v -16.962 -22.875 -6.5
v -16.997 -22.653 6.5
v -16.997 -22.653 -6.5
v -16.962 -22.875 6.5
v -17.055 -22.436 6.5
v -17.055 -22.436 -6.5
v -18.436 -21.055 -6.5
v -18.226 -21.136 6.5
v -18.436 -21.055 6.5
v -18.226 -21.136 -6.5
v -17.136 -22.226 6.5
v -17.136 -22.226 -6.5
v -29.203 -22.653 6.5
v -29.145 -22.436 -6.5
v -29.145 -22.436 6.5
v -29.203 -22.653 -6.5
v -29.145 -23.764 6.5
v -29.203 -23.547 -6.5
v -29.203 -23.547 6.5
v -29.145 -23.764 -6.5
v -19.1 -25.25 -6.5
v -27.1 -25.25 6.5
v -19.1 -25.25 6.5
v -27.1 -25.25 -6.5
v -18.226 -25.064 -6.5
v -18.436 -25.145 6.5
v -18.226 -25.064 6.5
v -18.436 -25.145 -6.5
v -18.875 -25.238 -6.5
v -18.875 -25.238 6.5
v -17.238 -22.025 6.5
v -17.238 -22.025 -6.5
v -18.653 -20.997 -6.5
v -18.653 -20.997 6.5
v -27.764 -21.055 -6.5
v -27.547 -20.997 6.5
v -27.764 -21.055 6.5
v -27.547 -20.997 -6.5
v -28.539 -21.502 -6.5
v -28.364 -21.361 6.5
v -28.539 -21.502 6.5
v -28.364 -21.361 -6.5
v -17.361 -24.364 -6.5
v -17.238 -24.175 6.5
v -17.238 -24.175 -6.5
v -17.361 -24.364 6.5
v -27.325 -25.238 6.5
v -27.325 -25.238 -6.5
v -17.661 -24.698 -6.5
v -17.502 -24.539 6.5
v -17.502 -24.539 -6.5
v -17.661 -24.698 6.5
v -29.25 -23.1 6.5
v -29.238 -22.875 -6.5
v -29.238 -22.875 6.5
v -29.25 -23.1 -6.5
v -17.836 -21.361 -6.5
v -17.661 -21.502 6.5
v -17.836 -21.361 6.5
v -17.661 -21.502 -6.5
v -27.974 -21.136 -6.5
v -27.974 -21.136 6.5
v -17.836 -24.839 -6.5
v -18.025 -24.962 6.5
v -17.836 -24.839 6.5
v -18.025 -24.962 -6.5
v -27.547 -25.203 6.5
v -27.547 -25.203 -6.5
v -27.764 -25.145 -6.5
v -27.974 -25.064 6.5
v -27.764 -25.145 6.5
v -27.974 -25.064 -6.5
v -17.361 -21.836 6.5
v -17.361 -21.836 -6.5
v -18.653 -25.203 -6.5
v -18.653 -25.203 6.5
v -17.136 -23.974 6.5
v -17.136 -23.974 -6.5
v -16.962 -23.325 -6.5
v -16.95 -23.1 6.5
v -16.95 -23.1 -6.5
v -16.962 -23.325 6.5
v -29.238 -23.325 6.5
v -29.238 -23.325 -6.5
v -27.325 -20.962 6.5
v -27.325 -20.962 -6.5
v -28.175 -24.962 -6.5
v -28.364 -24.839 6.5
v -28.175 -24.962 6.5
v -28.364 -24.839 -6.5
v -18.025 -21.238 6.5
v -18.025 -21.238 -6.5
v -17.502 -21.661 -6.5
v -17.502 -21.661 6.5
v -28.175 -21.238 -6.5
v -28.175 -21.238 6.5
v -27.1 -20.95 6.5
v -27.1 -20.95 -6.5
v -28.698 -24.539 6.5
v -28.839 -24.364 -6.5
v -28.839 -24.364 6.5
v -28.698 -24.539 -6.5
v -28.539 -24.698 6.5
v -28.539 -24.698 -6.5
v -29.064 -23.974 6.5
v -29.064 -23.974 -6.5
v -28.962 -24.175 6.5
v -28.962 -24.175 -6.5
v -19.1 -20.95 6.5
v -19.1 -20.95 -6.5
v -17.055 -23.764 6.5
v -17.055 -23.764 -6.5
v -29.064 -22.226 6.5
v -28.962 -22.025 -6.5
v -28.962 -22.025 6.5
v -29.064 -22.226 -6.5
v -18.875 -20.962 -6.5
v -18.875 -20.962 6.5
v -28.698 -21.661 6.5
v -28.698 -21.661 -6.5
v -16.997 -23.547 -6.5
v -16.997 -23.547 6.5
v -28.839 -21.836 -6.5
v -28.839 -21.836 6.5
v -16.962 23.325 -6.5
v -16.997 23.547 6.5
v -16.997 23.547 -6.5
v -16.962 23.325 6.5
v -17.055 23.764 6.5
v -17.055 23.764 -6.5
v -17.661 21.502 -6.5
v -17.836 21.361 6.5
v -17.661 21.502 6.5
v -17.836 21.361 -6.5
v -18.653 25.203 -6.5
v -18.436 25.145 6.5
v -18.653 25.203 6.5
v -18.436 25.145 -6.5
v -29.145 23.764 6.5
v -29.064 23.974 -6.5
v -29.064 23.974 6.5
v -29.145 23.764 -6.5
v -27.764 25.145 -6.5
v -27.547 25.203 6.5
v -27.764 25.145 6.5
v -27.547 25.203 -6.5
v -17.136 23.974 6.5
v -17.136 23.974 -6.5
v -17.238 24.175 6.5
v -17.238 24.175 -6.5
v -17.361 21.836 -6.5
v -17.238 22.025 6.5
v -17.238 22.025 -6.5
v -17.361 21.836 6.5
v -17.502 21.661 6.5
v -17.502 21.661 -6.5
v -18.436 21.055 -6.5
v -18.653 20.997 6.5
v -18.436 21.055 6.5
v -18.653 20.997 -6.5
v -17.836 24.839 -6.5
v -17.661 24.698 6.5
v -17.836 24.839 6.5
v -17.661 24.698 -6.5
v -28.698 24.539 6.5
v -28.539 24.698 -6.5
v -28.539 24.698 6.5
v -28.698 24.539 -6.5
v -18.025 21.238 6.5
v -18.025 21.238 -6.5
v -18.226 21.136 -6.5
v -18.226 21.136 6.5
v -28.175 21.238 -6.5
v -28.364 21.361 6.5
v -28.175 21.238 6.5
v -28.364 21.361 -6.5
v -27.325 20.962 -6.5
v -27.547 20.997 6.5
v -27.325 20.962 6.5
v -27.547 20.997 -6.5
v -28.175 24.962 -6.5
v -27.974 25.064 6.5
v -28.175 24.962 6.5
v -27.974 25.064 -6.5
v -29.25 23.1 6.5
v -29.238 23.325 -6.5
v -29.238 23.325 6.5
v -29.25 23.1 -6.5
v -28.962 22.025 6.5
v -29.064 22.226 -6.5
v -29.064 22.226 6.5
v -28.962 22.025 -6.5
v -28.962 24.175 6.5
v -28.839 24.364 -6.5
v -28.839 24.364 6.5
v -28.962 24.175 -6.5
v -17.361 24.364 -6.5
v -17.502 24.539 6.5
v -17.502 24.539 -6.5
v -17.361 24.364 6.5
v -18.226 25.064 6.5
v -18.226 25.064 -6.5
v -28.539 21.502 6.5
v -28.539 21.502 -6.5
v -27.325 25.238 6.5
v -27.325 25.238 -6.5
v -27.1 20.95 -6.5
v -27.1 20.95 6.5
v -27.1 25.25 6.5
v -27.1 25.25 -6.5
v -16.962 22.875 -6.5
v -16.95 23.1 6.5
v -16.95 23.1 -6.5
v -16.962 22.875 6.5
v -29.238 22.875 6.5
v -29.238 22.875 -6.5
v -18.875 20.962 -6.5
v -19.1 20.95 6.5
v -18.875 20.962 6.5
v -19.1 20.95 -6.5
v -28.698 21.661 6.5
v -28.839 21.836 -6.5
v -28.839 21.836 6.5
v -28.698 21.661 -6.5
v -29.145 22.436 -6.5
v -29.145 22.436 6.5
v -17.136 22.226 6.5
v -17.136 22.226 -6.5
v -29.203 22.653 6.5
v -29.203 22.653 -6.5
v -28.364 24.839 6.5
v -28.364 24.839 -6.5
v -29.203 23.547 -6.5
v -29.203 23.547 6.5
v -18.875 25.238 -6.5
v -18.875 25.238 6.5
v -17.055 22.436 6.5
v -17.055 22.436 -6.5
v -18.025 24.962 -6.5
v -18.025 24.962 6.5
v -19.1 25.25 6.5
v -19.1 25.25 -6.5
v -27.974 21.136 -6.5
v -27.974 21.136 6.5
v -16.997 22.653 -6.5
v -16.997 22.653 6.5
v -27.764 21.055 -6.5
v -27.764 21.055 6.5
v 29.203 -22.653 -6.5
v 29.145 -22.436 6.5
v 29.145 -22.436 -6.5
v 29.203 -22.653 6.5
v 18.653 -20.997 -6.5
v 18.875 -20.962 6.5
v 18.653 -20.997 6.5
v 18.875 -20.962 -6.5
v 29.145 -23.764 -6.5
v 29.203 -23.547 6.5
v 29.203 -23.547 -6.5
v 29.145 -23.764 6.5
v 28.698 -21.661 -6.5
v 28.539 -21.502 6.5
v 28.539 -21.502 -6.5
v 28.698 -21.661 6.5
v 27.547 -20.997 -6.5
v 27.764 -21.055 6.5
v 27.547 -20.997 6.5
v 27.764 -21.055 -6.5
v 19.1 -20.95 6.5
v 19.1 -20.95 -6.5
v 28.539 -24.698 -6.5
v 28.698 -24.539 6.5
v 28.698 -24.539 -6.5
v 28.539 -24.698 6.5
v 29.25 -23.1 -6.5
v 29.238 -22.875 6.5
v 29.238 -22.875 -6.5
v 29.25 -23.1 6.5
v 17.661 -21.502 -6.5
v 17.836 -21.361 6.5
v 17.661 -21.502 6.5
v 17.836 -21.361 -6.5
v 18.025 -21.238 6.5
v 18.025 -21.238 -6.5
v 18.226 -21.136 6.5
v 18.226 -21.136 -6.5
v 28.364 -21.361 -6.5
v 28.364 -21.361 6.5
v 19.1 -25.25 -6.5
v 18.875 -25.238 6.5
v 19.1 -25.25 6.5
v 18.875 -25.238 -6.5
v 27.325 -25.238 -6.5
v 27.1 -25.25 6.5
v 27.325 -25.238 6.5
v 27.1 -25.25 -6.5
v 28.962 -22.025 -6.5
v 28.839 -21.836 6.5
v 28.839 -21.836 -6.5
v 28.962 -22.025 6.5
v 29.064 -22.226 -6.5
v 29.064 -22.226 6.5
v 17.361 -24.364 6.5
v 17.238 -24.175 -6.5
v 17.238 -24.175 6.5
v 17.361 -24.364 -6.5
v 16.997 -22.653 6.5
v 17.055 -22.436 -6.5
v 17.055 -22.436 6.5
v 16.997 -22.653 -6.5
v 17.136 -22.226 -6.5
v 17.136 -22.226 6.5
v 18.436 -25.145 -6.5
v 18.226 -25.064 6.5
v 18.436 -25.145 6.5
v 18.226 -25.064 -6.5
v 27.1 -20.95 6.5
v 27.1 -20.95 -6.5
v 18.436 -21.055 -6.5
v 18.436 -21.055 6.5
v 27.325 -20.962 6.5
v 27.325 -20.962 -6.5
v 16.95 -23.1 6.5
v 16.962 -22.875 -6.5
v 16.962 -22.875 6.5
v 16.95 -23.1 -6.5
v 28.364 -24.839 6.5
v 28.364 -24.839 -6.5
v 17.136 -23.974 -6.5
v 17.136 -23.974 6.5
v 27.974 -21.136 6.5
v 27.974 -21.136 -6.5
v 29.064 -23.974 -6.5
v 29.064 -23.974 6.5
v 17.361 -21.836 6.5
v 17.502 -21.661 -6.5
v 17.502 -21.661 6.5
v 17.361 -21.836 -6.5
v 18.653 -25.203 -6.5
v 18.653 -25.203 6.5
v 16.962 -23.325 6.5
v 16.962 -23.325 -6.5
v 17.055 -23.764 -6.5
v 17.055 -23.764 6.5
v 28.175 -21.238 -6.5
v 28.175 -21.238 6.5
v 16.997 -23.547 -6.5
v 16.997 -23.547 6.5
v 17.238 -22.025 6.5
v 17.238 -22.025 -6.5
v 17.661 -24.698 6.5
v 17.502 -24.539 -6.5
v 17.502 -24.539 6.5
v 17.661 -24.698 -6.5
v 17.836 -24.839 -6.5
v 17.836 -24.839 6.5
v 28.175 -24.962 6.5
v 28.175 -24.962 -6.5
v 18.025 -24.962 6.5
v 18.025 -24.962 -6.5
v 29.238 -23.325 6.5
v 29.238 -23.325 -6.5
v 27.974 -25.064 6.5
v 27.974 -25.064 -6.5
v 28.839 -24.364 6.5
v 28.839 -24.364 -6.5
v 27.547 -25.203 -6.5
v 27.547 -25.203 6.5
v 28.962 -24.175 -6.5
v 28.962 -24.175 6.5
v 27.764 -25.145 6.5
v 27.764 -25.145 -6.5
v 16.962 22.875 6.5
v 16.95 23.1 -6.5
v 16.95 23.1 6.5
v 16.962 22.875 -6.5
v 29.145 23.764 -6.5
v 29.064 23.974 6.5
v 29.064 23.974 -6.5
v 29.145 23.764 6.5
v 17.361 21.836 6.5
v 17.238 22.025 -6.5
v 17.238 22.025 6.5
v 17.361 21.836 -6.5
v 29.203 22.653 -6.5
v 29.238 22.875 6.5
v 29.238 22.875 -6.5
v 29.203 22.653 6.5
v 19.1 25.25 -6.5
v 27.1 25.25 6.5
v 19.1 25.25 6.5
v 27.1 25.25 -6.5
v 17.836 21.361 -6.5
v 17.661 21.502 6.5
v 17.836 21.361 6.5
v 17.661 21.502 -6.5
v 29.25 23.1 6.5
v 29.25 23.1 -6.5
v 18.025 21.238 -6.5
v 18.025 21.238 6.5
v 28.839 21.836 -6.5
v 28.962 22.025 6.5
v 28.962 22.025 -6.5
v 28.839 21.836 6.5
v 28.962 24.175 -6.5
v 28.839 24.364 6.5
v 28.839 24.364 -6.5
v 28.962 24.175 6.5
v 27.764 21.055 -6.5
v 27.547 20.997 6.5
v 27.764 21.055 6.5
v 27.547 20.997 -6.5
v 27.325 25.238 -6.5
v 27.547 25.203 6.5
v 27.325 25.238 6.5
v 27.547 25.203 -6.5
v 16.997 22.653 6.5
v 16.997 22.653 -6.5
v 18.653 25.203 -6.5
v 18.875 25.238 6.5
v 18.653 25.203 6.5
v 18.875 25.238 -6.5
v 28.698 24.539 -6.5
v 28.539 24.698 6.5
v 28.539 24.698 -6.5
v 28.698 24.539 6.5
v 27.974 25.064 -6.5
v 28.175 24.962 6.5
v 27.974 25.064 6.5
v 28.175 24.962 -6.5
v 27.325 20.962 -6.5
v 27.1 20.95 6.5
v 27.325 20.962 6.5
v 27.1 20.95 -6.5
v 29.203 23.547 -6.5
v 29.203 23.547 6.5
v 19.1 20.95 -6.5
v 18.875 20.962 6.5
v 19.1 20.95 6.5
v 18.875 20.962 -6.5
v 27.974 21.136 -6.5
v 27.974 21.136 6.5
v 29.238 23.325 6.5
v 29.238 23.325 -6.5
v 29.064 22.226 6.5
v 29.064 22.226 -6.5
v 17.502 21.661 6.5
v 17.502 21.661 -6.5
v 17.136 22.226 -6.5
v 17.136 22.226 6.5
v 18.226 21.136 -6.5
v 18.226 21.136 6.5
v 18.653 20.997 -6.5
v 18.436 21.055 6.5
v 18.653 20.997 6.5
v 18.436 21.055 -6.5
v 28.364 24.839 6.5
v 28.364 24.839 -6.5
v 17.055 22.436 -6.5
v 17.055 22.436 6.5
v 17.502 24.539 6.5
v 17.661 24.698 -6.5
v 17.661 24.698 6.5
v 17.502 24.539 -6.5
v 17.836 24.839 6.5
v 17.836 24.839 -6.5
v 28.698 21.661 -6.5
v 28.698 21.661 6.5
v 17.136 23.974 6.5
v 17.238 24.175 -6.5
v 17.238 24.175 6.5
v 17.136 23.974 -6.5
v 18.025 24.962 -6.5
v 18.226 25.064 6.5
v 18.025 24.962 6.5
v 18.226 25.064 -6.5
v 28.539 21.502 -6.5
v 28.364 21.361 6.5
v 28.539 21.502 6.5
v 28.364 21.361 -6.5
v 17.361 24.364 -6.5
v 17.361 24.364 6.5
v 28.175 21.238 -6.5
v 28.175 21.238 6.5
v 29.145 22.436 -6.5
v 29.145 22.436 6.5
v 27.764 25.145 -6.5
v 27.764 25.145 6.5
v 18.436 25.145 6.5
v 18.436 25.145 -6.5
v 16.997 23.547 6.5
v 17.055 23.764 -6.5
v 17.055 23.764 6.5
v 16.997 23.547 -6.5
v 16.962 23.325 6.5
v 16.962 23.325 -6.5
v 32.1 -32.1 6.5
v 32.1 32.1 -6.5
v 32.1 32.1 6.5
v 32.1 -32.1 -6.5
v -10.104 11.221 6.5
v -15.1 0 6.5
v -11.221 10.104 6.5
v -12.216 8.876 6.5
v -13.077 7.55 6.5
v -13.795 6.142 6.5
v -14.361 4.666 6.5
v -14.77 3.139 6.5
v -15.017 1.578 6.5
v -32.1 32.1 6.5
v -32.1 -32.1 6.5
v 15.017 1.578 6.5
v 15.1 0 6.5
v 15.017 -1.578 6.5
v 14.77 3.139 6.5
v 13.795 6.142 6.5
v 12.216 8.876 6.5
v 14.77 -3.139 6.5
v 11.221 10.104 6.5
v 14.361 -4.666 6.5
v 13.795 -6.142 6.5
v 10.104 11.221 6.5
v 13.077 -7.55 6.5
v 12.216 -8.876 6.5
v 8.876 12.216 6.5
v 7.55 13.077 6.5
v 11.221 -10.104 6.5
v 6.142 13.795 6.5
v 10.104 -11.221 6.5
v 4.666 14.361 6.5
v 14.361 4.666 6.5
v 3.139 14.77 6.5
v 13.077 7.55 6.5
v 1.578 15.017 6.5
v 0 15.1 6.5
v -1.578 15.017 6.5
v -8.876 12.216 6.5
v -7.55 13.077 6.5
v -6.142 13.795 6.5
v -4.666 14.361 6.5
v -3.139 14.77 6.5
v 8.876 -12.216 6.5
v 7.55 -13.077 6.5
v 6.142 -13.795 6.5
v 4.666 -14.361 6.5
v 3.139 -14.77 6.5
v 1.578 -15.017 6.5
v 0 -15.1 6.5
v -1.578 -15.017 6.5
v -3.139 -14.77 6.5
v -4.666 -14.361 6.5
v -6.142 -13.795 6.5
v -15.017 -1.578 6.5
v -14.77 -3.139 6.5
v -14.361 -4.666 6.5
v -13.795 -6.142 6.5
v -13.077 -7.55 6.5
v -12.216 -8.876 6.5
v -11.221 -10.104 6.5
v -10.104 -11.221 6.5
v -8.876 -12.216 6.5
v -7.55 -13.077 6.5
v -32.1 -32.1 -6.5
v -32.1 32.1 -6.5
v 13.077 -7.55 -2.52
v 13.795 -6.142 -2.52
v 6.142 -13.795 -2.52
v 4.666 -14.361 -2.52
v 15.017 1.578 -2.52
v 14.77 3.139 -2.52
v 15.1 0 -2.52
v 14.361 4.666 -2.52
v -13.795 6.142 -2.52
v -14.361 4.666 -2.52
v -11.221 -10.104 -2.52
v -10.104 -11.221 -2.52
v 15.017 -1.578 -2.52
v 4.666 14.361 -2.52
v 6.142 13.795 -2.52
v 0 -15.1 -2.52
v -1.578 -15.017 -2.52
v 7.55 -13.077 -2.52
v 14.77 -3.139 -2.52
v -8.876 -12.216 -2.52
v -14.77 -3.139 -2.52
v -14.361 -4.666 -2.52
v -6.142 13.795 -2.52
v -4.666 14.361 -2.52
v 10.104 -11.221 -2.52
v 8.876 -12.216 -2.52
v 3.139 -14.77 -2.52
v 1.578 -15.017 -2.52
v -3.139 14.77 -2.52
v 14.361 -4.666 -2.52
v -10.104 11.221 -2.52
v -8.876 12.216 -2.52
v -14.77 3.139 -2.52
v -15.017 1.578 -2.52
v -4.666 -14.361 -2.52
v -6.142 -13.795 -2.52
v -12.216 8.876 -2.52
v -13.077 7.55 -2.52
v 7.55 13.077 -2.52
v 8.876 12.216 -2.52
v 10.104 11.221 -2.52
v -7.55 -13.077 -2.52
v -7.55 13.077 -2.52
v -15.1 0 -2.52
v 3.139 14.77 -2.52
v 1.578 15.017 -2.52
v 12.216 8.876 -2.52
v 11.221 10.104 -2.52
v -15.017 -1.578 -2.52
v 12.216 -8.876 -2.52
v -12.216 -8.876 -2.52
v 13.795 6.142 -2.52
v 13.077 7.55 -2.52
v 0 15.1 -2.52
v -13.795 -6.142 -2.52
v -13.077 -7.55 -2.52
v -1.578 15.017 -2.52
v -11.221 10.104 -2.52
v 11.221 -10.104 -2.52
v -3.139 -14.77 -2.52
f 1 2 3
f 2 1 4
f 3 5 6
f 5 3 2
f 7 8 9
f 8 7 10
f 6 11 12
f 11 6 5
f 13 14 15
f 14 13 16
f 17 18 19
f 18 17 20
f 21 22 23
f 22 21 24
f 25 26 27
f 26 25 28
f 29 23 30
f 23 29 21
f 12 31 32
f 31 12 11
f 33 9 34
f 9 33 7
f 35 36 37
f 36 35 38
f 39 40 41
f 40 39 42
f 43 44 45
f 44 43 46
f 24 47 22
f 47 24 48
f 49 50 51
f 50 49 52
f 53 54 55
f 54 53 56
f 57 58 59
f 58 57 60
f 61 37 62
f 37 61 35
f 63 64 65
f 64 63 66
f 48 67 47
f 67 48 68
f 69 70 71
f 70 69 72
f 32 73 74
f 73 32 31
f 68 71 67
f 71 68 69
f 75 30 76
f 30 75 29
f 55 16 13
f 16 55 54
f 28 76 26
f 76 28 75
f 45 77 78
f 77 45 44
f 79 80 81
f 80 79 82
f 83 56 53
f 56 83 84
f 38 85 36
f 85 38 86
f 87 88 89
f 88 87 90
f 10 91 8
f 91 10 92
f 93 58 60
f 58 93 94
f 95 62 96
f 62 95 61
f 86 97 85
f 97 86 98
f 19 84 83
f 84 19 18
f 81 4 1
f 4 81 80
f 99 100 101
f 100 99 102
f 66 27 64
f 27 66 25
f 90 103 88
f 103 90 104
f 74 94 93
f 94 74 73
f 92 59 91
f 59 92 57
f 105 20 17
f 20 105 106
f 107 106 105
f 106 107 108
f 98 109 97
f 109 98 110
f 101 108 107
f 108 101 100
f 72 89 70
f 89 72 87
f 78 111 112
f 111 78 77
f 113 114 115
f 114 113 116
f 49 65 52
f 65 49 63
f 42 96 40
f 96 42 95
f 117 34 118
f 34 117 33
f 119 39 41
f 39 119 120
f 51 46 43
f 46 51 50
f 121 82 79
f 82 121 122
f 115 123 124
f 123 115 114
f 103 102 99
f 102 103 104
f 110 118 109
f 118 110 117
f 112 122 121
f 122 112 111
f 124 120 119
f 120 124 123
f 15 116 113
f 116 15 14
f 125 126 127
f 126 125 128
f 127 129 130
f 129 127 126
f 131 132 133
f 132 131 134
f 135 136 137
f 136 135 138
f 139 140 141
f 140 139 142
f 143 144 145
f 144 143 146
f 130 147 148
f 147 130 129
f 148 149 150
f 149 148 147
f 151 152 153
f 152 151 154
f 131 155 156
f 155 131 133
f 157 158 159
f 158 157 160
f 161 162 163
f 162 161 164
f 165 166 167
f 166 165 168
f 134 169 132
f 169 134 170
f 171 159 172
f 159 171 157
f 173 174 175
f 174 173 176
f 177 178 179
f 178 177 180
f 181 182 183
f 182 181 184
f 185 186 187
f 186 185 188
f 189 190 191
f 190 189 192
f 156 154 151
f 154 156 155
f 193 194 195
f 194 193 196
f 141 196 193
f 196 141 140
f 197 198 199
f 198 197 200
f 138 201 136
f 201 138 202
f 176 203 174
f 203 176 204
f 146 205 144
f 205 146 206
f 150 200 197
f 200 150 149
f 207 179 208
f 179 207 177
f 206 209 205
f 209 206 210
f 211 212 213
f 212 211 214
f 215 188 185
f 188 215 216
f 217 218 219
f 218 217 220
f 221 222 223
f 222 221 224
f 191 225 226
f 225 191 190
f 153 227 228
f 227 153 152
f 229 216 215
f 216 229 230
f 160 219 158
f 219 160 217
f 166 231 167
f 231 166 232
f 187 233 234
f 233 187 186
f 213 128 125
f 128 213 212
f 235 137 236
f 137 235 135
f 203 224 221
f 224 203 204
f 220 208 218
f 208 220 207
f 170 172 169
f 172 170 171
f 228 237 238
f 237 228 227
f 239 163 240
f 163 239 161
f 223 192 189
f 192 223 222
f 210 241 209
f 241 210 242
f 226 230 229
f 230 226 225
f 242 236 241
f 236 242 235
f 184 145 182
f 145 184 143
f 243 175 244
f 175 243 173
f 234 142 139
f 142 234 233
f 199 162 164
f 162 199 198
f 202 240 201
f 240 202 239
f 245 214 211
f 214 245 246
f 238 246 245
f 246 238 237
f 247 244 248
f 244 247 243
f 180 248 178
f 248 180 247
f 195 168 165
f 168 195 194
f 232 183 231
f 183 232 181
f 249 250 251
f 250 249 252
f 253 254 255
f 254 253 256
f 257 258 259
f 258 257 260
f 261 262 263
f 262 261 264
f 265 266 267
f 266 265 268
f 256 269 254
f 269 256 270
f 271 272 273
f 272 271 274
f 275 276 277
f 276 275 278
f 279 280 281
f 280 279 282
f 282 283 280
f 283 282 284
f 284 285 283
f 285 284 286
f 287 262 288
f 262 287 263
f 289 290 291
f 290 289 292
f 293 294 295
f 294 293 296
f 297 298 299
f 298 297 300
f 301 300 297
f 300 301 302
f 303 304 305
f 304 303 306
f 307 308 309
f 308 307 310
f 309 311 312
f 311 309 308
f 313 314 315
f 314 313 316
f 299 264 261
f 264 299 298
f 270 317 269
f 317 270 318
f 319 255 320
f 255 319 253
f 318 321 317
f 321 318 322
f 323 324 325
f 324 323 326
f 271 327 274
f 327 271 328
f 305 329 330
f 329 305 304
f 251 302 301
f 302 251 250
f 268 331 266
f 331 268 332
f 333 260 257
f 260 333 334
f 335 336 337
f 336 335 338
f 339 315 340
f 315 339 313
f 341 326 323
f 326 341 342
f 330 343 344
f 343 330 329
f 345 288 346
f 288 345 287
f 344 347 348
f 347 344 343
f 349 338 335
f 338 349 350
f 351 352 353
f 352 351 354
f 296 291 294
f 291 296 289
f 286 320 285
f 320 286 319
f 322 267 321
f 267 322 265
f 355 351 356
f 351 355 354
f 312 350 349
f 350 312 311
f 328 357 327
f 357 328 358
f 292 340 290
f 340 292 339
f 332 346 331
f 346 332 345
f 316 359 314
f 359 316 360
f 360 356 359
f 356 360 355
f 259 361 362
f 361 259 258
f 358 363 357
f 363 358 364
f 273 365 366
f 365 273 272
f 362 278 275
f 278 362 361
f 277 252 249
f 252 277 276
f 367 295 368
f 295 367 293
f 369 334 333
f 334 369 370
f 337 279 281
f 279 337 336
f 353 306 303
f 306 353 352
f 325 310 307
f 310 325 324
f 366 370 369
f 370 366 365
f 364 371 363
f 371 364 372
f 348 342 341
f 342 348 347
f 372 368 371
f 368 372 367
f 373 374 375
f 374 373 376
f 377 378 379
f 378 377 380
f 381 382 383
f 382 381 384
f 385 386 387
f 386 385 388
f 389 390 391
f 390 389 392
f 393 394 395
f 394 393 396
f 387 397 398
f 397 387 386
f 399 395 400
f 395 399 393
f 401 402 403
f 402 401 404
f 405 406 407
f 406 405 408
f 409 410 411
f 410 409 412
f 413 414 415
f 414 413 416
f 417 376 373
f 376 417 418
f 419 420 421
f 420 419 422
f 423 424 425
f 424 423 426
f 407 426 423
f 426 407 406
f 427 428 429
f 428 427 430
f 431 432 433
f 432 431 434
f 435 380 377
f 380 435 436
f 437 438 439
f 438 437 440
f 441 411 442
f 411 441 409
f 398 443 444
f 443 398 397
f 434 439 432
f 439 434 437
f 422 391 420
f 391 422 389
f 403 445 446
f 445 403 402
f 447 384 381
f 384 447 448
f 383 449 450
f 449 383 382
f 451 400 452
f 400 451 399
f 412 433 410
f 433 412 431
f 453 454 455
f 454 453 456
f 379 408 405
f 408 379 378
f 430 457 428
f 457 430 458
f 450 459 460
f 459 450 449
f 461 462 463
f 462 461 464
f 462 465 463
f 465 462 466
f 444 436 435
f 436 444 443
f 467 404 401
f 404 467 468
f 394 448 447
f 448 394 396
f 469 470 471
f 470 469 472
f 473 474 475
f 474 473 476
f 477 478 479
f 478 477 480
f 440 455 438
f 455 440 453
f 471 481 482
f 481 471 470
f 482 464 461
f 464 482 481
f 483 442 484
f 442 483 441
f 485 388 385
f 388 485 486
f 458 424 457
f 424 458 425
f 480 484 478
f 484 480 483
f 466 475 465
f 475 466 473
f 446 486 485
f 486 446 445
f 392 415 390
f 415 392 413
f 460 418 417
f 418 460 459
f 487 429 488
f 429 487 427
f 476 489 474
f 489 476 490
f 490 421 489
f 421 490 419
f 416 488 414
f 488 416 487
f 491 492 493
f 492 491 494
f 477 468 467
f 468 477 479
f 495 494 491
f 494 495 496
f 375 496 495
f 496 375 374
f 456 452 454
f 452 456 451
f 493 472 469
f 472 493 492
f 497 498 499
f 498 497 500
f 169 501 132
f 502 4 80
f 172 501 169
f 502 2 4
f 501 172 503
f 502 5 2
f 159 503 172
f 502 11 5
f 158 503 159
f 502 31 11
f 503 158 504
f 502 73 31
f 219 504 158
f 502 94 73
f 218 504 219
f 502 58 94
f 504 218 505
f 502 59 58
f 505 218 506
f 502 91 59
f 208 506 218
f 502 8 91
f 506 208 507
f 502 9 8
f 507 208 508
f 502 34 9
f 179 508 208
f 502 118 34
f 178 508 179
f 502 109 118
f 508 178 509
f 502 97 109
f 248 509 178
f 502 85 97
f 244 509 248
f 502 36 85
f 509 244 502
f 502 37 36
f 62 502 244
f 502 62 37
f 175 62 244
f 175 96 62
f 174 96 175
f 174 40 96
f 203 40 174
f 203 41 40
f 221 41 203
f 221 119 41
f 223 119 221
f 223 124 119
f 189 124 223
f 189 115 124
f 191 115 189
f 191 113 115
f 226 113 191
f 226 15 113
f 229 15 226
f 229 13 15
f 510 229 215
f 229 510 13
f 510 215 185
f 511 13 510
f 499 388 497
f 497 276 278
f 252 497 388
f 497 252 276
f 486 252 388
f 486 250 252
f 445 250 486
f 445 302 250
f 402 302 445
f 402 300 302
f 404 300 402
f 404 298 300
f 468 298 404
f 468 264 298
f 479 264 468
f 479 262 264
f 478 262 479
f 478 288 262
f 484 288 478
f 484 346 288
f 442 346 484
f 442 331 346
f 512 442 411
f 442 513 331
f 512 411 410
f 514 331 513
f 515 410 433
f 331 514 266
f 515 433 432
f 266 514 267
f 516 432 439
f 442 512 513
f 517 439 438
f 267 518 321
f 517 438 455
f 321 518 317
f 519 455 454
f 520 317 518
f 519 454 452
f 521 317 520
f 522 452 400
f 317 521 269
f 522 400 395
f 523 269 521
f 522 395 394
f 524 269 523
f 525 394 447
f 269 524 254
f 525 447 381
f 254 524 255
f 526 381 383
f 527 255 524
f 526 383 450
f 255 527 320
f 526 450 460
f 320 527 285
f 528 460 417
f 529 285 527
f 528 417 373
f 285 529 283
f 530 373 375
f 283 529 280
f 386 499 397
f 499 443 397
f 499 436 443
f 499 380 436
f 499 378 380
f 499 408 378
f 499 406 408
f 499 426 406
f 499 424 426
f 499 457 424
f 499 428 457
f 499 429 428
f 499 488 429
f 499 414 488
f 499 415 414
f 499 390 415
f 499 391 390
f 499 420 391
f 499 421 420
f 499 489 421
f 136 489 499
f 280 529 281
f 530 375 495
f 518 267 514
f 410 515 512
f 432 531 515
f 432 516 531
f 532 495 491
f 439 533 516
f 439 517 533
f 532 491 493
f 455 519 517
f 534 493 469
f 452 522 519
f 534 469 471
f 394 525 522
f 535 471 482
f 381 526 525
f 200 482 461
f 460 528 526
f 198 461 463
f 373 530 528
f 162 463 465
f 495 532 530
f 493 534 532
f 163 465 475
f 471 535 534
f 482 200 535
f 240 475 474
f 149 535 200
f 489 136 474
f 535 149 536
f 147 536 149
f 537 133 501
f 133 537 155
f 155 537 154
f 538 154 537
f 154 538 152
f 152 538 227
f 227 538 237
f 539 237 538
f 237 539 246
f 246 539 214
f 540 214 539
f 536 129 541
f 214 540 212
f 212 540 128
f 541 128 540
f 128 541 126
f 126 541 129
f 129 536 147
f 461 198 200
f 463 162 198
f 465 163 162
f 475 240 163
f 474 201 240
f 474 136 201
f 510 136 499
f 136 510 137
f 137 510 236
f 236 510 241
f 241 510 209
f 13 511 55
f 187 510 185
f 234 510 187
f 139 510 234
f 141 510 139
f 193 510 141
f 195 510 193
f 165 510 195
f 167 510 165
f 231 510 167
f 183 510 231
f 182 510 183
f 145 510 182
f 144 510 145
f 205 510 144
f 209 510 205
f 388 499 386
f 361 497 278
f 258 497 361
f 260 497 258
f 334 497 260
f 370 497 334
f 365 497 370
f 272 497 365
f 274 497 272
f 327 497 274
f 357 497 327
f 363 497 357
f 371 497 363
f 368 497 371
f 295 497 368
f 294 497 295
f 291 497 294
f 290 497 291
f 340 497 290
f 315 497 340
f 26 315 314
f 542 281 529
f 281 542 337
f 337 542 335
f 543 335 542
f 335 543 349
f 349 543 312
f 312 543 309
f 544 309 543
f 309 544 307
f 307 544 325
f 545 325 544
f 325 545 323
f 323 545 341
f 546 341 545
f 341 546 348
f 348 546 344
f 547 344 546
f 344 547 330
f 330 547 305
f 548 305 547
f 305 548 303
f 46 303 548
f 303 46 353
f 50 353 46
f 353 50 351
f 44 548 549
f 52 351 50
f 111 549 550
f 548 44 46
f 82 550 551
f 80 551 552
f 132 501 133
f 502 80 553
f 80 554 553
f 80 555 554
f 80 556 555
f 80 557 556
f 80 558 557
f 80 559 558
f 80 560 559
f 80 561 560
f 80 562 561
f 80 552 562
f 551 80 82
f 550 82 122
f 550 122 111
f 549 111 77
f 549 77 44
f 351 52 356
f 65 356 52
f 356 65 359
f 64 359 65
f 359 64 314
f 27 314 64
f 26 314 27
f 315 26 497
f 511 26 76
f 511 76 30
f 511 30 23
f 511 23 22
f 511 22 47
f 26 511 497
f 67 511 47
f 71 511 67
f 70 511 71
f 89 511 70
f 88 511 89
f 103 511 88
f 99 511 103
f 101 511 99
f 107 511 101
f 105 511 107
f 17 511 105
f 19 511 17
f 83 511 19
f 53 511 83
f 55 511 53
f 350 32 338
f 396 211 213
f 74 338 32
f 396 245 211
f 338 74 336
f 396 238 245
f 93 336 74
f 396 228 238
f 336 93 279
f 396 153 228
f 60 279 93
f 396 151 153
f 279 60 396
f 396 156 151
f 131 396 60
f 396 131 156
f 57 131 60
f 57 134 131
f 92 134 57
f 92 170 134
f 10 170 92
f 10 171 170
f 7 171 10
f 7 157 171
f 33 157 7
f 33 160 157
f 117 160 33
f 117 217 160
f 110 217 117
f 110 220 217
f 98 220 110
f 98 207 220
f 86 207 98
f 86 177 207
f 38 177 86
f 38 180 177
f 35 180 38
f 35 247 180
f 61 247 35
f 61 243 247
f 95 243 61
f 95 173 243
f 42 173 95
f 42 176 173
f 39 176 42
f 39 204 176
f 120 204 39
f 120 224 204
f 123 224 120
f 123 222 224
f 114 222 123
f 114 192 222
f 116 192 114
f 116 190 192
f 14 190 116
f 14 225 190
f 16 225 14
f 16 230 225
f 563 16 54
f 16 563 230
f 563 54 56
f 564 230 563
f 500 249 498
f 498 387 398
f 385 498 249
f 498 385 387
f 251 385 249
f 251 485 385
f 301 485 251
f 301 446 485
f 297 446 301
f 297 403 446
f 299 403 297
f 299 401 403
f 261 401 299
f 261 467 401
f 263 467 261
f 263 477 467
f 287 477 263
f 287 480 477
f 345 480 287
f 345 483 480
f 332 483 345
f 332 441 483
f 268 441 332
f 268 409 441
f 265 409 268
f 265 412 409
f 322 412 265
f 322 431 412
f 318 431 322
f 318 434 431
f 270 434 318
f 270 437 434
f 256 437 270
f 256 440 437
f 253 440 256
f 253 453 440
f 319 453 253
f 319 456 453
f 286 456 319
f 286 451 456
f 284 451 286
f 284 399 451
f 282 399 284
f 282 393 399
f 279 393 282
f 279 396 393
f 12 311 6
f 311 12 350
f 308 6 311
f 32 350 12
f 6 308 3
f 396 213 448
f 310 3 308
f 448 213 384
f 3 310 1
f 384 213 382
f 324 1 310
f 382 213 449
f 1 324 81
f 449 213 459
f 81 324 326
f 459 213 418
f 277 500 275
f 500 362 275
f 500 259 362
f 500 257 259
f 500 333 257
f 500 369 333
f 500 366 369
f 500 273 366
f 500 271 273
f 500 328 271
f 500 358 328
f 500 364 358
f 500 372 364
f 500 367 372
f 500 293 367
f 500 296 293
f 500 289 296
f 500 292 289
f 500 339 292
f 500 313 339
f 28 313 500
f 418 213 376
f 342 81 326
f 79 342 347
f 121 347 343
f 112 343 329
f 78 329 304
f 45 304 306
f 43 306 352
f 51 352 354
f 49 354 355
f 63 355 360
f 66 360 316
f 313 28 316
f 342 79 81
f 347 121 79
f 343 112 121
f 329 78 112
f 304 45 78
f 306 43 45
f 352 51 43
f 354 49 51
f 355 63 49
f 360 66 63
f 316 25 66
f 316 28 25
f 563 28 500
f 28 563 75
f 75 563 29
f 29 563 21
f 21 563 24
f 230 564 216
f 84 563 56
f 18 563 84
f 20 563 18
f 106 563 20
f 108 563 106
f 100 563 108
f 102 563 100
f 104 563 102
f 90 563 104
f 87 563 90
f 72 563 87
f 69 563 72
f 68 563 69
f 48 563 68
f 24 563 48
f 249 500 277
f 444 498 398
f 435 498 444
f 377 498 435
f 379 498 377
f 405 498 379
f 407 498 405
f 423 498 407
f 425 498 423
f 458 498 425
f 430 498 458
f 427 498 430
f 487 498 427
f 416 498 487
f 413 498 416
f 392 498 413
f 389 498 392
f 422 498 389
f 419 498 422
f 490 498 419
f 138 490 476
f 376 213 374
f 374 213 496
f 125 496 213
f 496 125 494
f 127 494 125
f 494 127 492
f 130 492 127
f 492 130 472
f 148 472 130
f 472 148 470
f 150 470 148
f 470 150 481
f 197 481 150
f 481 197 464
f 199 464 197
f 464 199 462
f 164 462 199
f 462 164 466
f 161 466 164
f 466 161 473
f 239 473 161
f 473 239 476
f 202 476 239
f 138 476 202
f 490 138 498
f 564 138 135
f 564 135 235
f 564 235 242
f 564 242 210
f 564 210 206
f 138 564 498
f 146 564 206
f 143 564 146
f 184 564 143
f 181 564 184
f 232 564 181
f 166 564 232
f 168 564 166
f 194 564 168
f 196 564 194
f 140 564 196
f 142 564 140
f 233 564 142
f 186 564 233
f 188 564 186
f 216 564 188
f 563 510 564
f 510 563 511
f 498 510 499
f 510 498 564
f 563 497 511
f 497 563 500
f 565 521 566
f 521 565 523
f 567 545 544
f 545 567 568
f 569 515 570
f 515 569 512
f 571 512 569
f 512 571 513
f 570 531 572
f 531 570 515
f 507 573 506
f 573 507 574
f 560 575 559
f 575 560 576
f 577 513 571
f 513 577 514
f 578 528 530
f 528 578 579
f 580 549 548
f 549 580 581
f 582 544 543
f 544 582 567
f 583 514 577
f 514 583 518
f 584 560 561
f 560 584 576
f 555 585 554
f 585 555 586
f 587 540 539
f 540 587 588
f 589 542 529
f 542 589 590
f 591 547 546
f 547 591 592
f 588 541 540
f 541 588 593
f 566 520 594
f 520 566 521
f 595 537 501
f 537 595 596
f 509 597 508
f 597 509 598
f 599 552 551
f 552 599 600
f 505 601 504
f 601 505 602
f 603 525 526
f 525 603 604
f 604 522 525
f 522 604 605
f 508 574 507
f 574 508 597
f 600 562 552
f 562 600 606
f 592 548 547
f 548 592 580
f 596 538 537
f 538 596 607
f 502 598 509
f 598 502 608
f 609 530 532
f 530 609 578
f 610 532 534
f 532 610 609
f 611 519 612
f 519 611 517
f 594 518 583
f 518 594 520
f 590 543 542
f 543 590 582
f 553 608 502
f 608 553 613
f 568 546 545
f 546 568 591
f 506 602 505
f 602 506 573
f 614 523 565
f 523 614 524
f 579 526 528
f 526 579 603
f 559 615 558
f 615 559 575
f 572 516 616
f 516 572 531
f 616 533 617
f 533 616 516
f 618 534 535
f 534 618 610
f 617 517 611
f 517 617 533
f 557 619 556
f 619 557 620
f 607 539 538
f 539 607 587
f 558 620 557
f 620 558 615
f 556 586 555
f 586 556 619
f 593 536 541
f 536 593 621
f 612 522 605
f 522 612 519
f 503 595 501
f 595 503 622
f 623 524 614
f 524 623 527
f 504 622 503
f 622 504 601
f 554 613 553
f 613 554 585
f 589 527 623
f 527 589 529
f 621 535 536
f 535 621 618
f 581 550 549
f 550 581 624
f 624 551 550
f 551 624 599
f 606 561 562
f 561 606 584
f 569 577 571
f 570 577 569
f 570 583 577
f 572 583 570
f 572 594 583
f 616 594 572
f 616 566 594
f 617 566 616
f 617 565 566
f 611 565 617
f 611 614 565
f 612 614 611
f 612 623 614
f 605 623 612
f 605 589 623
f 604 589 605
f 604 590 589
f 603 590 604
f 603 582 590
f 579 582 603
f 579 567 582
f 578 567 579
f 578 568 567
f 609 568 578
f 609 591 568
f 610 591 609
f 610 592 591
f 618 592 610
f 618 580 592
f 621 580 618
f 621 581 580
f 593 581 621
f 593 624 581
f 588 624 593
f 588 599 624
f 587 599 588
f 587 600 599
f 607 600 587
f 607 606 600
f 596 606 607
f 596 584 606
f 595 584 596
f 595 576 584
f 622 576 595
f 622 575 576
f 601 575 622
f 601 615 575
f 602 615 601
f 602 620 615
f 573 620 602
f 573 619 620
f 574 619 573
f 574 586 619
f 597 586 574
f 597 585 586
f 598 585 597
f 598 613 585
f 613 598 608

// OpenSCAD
// Bearing mounting plate with 30.2 mm pocket.
$fn = 60;
eps = 0.02;
plate_w = 64.2;
plate_t = 13;
bearing_d = 30.2;
pocket_d = 9;
mount_pitch = 46.2;
module slot(x, y) {
    hull() {
        translate([x - 4, y, -plate_t / 2 - eps]) cylinder(d = 4.3, h = plate_t + 2 * eps);
        translate([x + 4, y, -plate_t / 2 - eps]) cylinder(d = 4.3, h = plate_t + 2 * eps);
    }
}
difference() {
    cube([plate_w, plate_w, plate_t], center = true);
    translate([0, 0, plate_t / 2 - pocket_d - eps]) cylinder(d = bearing_d, h = pocket_d + 2 * eps);
    for (x = [-mount_pitch / 2, mount_pitch / 2], y = [-mount_pitch / 2, mount_pitch / 2]) slot(x, y);
}
